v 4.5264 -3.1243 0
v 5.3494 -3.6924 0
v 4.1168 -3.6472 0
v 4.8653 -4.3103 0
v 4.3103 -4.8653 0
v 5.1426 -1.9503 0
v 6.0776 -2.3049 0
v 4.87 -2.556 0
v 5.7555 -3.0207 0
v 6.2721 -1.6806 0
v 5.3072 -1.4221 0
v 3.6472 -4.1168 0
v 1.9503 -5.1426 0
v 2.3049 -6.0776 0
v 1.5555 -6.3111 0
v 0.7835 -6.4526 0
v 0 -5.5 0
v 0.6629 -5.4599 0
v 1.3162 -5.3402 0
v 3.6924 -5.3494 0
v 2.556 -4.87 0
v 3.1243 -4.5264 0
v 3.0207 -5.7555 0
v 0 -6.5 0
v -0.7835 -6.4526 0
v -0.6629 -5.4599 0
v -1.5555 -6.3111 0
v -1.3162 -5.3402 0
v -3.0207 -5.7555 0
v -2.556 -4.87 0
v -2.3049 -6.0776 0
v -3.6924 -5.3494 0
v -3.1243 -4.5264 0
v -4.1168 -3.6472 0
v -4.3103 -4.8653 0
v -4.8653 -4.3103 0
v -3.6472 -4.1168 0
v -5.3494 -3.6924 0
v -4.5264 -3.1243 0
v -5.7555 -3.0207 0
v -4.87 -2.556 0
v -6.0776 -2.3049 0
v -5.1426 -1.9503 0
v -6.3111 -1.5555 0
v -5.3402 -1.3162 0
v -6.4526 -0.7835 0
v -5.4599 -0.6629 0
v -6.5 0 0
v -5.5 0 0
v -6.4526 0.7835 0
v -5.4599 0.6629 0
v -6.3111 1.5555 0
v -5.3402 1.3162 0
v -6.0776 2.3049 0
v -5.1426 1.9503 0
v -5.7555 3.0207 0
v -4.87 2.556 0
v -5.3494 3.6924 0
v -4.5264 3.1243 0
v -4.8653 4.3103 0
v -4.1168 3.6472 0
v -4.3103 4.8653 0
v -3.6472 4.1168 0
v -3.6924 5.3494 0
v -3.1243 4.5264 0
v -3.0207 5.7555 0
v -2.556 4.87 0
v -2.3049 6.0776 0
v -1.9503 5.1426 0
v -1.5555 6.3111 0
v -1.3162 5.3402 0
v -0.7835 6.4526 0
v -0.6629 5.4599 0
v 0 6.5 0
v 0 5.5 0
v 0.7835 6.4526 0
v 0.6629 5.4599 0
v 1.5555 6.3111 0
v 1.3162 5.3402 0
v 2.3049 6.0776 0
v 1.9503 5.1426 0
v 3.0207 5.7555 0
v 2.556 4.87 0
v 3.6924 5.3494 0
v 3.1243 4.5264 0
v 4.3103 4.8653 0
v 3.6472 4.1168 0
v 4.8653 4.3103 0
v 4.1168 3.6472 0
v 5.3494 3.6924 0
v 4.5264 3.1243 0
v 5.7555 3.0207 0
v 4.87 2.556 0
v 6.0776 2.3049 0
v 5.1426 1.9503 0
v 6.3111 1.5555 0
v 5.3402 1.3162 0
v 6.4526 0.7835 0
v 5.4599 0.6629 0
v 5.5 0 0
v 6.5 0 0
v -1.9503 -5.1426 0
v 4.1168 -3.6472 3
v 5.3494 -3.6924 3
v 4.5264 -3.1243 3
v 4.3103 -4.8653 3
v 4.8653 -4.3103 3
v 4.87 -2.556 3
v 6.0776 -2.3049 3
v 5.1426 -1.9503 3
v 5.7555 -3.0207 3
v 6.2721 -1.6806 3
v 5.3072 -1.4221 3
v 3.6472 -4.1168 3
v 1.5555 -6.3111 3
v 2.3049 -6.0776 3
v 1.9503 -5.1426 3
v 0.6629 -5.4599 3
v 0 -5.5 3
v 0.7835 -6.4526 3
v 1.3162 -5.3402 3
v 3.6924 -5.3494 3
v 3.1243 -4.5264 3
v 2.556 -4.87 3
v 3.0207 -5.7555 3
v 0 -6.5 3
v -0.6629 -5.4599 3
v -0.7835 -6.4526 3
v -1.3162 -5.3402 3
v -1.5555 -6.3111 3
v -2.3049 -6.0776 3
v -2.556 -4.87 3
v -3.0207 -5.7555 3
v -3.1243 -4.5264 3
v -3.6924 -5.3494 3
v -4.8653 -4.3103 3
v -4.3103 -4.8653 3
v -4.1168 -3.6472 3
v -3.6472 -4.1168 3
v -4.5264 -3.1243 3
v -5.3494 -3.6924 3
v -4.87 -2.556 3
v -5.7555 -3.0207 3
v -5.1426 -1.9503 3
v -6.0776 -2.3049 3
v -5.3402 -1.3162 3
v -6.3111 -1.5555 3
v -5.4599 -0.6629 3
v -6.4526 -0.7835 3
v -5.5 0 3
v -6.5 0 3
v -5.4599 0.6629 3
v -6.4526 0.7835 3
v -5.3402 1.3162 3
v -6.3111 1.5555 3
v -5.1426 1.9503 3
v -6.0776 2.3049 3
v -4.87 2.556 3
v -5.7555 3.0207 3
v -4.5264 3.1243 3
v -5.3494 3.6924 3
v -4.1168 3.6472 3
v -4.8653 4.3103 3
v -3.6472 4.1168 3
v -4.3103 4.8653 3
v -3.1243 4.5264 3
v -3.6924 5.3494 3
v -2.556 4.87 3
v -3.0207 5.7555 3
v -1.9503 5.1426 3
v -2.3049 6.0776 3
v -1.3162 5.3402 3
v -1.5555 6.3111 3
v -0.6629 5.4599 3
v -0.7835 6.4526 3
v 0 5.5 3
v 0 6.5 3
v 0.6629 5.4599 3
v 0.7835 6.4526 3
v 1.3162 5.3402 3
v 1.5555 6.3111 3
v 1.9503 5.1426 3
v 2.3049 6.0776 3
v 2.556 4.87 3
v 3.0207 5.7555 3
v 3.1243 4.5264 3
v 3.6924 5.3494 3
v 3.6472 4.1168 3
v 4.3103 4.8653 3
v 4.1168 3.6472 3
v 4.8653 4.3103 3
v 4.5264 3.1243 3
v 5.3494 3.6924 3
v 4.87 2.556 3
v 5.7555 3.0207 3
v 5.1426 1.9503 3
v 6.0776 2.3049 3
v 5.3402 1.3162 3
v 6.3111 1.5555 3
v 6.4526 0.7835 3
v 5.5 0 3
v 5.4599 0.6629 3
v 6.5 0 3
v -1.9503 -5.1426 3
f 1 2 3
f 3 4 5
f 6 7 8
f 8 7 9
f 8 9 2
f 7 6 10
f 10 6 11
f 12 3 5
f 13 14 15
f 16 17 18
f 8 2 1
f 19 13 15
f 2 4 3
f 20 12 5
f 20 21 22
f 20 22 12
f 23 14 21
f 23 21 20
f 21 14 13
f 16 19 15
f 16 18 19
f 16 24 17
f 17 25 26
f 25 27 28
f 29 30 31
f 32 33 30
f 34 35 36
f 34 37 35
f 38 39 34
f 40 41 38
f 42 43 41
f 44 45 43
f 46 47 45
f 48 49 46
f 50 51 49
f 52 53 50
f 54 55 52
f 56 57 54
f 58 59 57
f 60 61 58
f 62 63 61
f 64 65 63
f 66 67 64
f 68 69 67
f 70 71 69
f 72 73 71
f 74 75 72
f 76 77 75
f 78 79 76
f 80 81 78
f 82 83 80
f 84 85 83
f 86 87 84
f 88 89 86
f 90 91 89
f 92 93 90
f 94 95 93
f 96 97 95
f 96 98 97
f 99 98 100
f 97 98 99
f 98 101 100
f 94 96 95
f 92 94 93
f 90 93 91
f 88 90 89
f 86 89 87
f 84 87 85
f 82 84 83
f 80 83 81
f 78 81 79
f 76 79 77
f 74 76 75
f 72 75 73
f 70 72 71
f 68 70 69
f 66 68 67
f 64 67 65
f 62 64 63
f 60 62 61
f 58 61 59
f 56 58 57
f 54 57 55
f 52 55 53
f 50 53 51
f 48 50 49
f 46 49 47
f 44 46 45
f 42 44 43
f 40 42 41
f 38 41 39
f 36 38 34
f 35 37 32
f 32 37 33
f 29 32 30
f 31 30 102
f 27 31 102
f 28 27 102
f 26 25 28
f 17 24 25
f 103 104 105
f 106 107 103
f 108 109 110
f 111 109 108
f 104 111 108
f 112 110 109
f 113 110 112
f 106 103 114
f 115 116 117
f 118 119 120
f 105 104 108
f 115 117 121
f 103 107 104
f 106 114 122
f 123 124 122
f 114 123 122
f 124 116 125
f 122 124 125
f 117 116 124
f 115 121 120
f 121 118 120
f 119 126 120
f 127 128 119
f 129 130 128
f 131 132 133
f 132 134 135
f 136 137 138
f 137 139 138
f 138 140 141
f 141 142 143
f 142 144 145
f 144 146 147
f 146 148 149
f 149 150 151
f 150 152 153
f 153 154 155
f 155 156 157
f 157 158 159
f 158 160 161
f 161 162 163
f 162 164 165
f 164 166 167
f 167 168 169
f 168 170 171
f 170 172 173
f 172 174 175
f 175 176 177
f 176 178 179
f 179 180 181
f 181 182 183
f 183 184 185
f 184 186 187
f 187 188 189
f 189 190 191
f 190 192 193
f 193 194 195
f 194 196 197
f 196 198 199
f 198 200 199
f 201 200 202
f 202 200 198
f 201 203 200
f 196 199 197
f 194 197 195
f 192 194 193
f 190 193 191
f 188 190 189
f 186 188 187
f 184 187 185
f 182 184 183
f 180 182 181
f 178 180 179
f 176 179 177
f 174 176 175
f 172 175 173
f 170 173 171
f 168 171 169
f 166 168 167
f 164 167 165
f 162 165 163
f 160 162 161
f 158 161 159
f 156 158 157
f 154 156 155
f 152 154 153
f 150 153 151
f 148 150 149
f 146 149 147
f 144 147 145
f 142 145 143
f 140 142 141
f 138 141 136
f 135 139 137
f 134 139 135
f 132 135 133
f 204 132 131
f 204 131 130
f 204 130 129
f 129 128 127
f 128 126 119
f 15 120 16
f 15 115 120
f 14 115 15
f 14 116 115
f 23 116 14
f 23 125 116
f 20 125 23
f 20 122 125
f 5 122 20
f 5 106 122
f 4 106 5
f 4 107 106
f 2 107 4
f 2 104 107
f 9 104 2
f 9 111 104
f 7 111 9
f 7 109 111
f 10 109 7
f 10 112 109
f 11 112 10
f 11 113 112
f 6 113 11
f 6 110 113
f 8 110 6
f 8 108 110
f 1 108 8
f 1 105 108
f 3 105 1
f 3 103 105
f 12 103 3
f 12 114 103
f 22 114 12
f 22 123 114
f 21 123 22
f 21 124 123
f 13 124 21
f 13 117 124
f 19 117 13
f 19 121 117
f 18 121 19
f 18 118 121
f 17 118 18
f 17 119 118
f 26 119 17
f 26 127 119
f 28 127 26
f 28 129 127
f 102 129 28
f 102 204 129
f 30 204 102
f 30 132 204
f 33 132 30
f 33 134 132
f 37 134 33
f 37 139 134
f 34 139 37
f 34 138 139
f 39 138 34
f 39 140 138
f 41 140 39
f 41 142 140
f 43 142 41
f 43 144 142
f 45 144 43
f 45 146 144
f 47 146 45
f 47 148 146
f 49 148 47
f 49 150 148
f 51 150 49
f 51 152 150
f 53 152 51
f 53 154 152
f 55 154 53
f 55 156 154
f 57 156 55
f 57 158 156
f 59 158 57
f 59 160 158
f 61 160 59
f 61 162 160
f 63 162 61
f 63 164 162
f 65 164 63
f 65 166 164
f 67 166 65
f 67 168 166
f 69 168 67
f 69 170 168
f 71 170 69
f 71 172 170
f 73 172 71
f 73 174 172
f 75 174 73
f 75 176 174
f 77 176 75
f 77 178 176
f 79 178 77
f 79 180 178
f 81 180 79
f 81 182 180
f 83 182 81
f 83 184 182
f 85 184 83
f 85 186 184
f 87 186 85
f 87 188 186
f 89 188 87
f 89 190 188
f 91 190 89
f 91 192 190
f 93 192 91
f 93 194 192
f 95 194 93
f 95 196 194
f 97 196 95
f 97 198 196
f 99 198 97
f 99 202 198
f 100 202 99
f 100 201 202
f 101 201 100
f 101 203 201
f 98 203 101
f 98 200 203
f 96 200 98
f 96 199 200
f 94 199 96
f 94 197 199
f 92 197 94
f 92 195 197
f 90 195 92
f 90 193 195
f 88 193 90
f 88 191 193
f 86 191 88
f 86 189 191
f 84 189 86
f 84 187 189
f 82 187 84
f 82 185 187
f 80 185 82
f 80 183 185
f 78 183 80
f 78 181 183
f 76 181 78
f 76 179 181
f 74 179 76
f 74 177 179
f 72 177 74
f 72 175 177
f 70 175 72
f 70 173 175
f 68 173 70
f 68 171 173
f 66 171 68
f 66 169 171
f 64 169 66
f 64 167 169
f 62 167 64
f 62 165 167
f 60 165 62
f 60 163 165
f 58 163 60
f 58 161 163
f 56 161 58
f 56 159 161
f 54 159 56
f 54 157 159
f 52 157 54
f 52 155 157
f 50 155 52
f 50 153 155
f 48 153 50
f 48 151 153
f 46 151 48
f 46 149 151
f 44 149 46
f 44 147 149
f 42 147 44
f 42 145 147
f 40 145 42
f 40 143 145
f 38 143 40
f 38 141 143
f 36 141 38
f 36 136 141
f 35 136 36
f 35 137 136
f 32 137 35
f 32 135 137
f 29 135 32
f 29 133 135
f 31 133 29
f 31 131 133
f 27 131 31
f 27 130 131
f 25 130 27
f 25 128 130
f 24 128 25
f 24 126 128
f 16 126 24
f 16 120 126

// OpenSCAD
// file: Tools.scad
module hCircle(r1, r2) {
	difference() {
		circle(r1);
		circle(r2);
	}
}

module slice(angle, r = 10000) {
	if($children > 0) {
		intersection() {
			polygon(concat([[0,0]],
				[ for (x=[0:0.1:angle]) [cos(x)*r, sin(x)*r] ]));

			children();
		}
	}
	else {
			polygon(concat([[0,0]],
				[ for (x=[0:0.1:angle]) [cos(x)*r, sin(x)*r] ]));
	}
}
// file: Values.scad
$fs = 0.3;
$fa = 7;

wallSize = 1;
clipHeight = 3;

openingAngle = 70;

use <Tools.scad>
// main file
include <Values.scad>

module cableHole(cd = 3, ow = -1) {
	openingWidth = (ow > 0) ? ow : cd;

	//wCirclePos = cd/2 - sqrt(pow(cd/2, 2) - pow(openingWidth/2, 2));
	//backShift = - cd/2 - ( (wCirclePos < wallSize) ? wallSize - wCirclePos : 0);

	backShift = -cd/2 - wallSize;

	translate([backShift, 0]) {
		#circle(r = cd/2);
		translate([0, -openingWidth/2]) square([1000, openingWidth]);
	}
}

module cableHoles(r, cables) {
	for(x = [0:len(cables) - 1]) rotate(360/len(cables) * x) translate([r, 0])
		cableHole(cables[x][0], cables[x][1]);
}

module cableRings(r, cables) {
	for(x = [0:len(cables) - 1]) rotate(360/len(cables) * x) translate([r - cables[x][0]/2 - wallSize, 0])
		circle(r = cables[x][0]/2 + wallSize);
}

module multiCableClip(r, cables) linear_extrude(height = clipHeight) {
	difference() {
		union() {
			difference() {
				circle(r = r);
				circle(r = r - wallSize);
			}
			intersection() {
				cableRings(r, cables);
				circle(r = r);
			}
		}

		cableHoles(r, cables);
	}
}

module multiOuterClip(r, angle = 15) linear_extrude(height = clipHeight) {
	slice(360 - angle) difference() {
		circle(r = r + wallSize);
		circle(r = r);
	}
}

cR = 5.5;
cbles = [ [3, 2.5], [3, 2.5], [3, 2.5]];


multiCableClip(cR, cbles);
!multiOuterClip(cR);
